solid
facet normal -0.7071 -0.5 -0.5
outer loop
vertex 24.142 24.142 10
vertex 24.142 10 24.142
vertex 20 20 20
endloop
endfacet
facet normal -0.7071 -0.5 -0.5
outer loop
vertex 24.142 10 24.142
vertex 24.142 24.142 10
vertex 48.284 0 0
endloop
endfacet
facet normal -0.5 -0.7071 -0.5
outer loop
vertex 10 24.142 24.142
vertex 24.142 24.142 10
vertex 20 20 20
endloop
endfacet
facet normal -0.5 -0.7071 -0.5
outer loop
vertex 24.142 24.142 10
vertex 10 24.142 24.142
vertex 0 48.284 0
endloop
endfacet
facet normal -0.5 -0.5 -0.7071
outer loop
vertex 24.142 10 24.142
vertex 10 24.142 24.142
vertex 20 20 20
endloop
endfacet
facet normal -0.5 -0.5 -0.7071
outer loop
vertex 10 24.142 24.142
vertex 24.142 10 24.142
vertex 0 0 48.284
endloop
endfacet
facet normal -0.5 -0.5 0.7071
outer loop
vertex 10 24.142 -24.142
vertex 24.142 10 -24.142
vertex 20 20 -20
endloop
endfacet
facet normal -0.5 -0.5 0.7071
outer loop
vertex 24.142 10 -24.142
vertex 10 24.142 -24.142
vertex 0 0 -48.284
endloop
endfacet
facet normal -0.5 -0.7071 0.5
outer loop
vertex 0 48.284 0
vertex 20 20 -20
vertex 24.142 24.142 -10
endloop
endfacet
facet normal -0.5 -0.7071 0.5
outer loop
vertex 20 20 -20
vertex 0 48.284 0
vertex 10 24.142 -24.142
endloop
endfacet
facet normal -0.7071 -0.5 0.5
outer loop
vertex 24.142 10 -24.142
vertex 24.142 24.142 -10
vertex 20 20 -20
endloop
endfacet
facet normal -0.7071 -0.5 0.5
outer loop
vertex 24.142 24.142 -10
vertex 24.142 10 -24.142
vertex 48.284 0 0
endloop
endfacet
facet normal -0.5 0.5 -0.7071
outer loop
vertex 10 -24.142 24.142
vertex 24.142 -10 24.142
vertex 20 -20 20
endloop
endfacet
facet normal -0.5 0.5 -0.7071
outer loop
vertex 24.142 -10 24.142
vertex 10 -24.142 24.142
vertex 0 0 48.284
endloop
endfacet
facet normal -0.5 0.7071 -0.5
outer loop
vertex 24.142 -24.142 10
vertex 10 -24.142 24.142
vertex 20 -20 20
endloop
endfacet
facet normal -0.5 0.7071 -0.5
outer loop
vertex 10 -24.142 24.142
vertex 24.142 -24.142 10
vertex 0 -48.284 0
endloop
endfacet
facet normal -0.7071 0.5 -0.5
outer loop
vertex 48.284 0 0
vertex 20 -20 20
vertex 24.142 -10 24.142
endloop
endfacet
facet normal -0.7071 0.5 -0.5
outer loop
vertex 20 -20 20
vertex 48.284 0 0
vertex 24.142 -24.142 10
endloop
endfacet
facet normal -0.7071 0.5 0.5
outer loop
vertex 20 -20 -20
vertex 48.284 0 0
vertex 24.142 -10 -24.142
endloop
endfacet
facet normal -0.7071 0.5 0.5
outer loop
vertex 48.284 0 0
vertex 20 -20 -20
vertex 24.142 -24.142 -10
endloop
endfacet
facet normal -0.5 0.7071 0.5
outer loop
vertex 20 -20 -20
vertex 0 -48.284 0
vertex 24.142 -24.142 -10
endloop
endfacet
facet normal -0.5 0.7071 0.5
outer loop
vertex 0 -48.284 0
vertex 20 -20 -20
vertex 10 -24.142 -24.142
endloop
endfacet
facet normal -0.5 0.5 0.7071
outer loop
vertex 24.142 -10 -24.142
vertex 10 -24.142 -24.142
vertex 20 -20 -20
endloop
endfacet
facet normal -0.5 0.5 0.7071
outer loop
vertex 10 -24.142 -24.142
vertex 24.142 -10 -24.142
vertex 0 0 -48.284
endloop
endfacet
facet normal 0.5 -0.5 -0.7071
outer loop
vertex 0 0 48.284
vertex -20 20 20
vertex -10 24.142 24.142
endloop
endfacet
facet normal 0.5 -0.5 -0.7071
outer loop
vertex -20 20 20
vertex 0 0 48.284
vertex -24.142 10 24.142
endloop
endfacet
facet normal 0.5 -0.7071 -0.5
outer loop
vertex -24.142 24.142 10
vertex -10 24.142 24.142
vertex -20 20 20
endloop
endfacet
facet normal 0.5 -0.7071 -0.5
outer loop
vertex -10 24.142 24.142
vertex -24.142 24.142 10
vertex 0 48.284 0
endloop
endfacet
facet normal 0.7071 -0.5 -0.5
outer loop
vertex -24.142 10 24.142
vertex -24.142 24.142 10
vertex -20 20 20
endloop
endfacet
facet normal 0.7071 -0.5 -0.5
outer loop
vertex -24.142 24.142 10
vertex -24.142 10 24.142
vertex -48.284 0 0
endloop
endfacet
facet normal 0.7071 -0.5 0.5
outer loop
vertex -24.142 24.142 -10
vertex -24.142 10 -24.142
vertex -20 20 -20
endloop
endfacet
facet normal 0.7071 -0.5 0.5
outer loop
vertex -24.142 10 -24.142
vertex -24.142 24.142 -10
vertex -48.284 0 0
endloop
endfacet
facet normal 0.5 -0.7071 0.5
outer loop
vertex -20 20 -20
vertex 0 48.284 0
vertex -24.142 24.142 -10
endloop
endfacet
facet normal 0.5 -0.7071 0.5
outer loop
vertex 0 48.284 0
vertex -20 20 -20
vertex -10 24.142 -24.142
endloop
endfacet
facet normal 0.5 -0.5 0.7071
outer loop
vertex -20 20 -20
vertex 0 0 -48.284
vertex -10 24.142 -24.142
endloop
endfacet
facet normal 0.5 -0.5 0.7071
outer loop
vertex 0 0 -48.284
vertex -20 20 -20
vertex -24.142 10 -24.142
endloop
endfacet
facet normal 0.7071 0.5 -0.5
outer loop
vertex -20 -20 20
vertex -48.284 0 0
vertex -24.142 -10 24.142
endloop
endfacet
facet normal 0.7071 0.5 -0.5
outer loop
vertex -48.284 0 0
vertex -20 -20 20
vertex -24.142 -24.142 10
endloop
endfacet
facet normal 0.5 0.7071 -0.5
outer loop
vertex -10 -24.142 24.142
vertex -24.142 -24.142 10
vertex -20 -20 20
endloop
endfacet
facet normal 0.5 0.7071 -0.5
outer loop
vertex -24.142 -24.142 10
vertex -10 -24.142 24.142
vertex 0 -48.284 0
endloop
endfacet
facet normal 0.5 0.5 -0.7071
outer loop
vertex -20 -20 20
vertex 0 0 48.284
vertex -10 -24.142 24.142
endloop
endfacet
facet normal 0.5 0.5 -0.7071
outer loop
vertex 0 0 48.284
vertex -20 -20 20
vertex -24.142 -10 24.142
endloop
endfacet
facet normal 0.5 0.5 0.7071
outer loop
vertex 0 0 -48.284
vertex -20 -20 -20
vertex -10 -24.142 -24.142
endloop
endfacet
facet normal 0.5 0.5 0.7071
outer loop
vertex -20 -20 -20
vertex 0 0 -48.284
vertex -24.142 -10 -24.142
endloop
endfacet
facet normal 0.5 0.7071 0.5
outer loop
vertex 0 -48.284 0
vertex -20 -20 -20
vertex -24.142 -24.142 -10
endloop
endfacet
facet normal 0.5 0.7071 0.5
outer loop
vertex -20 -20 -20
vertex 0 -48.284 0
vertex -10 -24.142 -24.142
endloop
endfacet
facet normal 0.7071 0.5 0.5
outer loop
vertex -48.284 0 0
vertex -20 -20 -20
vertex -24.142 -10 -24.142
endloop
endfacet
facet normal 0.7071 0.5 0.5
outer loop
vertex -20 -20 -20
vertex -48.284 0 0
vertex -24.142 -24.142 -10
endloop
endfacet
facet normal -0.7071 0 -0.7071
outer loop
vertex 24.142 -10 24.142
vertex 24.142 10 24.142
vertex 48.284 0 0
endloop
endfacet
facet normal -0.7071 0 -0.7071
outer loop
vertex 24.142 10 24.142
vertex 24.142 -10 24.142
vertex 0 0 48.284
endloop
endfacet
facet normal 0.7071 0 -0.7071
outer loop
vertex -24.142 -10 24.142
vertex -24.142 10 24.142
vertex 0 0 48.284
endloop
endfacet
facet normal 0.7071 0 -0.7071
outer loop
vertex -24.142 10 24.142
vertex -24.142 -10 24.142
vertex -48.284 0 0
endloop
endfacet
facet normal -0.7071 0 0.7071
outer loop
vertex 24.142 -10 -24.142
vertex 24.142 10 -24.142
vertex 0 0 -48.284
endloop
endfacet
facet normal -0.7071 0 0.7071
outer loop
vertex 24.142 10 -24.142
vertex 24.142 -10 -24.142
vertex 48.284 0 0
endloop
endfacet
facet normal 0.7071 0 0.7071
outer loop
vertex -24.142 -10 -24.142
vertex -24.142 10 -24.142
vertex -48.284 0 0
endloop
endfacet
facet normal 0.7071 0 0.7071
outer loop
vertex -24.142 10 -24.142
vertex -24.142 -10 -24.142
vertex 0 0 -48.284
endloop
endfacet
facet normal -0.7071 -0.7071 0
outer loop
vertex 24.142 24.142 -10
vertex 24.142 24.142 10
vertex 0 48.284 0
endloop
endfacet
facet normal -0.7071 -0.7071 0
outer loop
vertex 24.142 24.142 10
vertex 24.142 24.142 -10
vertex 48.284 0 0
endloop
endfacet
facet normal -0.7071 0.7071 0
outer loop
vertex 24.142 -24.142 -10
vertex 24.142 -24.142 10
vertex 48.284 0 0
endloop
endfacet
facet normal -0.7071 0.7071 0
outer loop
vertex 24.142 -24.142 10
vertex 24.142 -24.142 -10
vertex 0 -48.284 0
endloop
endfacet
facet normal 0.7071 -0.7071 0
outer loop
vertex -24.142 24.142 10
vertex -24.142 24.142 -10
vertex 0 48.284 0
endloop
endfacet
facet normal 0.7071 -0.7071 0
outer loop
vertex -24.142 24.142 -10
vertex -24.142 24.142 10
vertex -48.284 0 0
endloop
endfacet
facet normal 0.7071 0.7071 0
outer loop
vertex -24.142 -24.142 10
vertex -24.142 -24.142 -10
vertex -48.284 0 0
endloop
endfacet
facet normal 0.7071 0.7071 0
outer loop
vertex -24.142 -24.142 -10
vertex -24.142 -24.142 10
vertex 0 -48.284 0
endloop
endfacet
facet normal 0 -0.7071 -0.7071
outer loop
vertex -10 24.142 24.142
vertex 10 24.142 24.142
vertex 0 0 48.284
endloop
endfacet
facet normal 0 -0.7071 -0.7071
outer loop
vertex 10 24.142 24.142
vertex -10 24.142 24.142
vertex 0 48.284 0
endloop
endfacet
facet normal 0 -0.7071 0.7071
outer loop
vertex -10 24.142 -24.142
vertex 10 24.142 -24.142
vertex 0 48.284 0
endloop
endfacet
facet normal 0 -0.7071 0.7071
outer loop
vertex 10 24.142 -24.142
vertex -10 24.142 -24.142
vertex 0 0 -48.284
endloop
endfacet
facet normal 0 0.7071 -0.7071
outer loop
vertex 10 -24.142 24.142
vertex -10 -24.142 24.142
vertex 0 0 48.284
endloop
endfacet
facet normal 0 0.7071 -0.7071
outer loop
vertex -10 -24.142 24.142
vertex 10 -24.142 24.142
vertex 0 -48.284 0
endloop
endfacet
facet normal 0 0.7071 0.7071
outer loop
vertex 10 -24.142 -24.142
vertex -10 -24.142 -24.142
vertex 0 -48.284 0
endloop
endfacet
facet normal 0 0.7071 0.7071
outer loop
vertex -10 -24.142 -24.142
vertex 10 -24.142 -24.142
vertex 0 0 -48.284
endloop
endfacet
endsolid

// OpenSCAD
// Joined Truncated Cube
//   coords via: http://dmccooey.com/polyhedra/JoinedTruncatedCube.html
//
C0 = (1 + sqrt(2)) / 2;
C1 =  1 + sqrt(2);

scaling_factor = 20;

// rhombus - 0 8 2 6
f1 = [ [0, 8, 38], [2, 6, 38], [0, 6, 38], [2, 8, 38], [2, 6, 0, 8] ];
// kite -  37 21 3 13
f2 = [ [3, 13, 38], [3, 21, 38], [21, 37, 38], [3, 37, 21], [21, 3, 13, 37]];

vertices = [
 [ 0.0,  0.0,   C1], [ 0.0,  0.0,  -C1],
 [  C1,  0.0,  0.0], [ -C1,  0.0,  0.0],
 [ 0.0,   C1,  0.0], [ 0.0,  -C1,  0.0],
 [  C0,  0.5,   C0], [  C0,  0.5,  -C0], [  C0, -0.5,   C0], [  C0, -0.5,  -C0],
 [ -C0,  0.5,   C0], [ -C0,  0.5,  -C0], [ -C0, -0.5,   C0], [ -C0, -0.5,  -C0],
 [  C0,   C0,  0.5], [  C0,   C0, -0.5], [  C0,  -C0,  0.5], [  C0,  -C0, -0.5],
 [ -C0,   C0,  0.5], [ -C0,   C0, -0.5], [ -C0,  -C0,  0.5], [ -C0,  -C0, -0.5],
 [ 0.5,   C0,   C0], [ 0.5,   C0,  -C0], [ 0.5,  -C0,   C0], [ 0.5,  -C0,  -C0],
 [-0.5,   C0,   C0], [-0.5,   C0,  -C0], [-0.5,  -C0,   C0], [-0.5,  -C0,  -C0],
 [ 1.0,  1.0,  1.0], [ 1.0,  1.0, -1.0], [ 1.0, -1.0,  1.0], [ 1.0, -1.0, -1.0],
 [-1.0,  1.0,  1.0], [-1.0,  1.0, -1.0], [-1.0, -1.0,  1.0], [-1.0, -1.0, -1.0],
 [   0,    0,    0]
];

faces = [
  [ 30,  6,  2, 14], [ 30, 14,  4, 22], [ 30, 22,  0,  6],
  [ 31,  7,  1, 23], [ 31, 23,  4, 15], [ 31, 15,  2,  7],
  [ 32,  8,  0, 24], [ 32, 24,  5, 16], [ 32, 16,  2,  8],
  [ 33,  9,  2, 17], [ 33, 17,  5, 25], [ 33, 25,  1,  9],
  [ 34, 10,  0, 26], [ 34, 26,  4, 18], [ 34, 18,  3, 10],
  [ 35, 11,  3, 19], [ 35, 19,  4, 27], [ 35, 27,  1, 11],
  [ 36, 12,  3, 20], [ 36, 20,  5, 28], [ 36, 28,  0, 12],
  [ 37, 13,  1, 29], [ 37, 29,  5, 21], [ 37, 21,  3, 13],
  [  0,  8,  2,  6], [  0, 10,  3, 12],
  [  1,  7,  2,  9], [  1, 13,  3, 11],
  [  2, 15,  4, 14], [  2, 16,  5, 17],
  [  3, 18,  4, 19], [  3, 21,  5, 20],
  [  4, 26,  0, 22], [  4, 23,  1, 27],
  [  5, 24,  0, 28], [  5, 29,  1, 25]
];

scale(scaling_factor) {
  polyhedron(points=vertices, faces=faces, convexity=20);
/*
    polyhedron(points=vertices, faces=f1, convexity=20);
    polyhedron(points=vertices, faces=f2, convexity=20);
*/
}
